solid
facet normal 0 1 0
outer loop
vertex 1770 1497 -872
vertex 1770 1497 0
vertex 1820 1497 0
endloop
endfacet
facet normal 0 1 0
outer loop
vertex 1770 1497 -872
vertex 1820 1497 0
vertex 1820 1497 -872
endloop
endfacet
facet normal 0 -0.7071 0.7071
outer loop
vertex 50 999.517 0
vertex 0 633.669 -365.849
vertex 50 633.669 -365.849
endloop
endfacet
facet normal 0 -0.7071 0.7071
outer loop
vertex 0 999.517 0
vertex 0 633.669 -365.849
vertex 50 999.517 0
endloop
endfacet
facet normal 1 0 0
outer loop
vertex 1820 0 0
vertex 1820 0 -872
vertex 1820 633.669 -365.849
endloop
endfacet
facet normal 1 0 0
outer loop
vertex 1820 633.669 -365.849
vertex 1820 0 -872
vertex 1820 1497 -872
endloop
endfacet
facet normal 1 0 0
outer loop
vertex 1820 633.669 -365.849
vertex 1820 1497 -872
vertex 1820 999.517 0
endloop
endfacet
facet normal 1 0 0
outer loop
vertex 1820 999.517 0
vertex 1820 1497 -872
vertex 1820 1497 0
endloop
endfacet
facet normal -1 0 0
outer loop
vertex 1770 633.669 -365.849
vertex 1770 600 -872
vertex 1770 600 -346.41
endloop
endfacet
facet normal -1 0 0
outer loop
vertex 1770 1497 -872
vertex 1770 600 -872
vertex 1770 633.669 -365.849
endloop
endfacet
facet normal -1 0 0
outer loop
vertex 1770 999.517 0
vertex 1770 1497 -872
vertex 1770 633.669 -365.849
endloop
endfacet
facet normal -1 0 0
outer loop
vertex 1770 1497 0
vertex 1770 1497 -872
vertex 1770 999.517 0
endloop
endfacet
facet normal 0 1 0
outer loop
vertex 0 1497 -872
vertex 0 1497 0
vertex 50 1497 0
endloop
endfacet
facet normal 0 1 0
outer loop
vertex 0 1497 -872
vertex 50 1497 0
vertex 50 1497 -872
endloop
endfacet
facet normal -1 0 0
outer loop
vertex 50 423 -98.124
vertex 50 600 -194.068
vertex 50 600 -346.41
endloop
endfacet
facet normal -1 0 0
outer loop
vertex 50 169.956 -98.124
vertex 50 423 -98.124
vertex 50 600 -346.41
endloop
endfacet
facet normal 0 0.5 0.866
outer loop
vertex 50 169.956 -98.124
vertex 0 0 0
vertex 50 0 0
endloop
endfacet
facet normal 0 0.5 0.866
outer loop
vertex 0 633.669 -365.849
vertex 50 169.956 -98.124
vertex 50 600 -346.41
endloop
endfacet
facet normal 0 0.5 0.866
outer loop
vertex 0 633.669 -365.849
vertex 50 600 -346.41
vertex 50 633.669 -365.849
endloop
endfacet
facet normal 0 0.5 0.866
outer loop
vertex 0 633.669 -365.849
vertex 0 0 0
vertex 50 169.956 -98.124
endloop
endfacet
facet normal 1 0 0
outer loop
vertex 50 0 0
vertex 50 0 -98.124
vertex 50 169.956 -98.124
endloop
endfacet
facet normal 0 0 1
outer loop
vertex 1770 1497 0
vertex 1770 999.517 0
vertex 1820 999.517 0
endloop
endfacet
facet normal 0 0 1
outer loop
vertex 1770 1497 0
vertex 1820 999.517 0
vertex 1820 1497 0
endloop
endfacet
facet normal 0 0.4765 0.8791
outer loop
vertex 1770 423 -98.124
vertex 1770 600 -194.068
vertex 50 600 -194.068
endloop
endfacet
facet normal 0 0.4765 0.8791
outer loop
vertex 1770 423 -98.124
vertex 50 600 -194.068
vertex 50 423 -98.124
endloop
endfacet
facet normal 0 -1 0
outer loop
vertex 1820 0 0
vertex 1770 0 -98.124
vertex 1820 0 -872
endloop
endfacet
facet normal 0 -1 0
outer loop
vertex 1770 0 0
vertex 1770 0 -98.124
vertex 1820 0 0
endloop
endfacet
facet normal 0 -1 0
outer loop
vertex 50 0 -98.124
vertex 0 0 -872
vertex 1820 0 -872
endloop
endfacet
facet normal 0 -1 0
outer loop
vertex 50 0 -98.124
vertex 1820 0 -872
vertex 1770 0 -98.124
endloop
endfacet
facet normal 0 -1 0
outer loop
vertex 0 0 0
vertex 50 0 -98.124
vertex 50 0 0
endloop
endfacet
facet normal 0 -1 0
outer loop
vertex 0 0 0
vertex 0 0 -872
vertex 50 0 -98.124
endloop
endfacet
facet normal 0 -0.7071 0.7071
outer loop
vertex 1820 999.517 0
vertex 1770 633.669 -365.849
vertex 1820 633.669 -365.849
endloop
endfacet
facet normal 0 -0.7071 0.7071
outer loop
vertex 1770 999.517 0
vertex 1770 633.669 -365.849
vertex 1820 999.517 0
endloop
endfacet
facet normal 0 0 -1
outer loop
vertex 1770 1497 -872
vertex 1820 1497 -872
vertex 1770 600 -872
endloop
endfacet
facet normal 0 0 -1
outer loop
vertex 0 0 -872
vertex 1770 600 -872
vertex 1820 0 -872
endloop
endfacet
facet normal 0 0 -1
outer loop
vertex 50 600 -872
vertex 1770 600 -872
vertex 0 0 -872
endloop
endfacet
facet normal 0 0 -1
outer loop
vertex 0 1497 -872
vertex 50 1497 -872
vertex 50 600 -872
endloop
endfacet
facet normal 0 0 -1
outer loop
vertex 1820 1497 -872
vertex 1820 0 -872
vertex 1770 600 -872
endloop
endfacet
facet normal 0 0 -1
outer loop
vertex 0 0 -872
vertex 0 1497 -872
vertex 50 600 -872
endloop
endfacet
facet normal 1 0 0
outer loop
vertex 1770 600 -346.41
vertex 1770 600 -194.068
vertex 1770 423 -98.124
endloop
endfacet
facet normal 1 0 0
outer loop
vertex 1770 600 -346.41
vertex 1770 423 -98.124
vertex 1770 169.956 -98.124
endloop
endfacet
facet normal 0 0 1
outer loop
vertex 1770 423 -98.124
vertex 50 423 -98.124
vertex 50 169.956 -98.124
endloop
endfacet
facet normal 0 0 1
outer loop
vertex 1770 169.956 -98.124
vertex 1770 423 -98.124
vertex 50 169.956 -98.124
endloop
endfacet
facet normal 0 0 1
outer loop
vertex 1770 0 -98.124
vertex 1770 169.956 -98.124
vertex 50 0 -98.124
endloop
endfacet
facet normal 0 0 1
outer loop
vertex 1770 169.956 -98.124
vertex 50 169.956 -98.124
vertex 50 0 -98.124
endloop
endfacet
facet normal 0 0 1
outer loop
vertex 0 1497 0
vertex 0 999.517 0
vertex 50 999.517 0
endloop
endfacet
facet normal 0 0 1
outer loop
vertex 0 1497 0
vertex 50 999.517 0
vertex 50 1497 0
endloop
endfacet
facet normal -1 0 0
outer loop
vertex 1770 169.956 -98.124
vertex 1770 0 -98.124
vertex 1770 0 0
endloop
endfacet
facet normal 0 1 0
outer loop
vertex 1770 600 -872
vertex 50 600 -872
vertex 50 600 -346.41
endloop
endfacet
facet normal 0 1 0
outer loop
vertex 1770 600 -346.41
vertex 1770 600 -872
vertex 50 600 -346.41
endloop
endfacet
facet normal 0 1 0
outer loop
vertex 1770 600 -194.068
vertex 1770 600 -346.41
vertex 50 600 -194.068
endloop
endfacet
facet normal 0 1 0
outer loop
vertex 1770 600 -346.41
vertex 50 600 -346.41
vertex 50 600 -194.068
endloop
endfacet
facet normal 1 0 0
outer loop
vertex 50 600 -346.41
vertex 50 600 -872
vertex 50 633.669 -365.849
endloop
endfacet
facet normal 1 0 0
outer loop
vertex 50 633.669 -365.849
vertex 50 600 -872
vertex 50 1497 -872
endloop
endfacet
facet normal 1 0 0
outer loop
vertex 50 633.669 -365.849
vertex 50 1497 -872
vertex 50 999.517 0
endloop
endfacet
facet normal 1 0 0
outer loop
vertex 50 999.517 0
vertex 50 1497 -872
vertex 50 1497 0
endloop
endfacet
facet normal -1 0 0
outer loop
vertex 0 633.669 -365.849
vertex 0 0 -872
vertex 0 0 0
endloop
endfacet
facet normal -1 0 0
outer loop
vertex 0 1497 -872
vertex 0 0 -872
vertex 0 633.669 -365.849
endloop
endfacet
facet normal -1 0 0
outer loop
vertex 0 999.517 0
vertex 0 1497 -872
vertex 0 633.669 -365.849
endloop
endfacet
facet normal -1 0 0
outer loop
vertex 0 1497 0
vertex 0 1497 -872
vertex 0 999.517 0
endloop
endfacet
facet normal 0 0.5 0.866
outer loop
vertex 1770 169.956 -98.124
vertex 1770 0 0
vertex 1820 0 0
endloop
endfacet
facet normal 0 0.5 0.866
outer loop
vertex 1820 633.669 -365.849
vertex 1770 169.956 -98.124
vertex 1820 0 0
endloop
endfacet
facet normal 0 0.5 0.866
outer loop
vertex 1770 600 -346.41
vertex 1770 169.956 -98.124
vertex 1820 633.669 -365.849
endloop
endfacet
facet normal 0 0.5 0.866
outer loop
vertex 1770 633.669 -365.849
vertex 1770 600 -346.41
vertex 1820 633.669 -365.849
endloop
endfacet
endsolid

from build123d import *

# Parameters (mm, degrees)
EXTRUDE_1_DEPTH     = 50
EXTRUDE_2_DEPTH     = 1720
EXTRUDE_START       = 1770
EXTRUDE_3_DEPTH     = 50
SKETCH_3_W          = 1820
SKETCH_3_H          = 1497
CUT_EXTRUDE_1_DEPTH = 850


with BuildPart() as part:
    # 草图1 → 凸台-拉伸1 (new body)
    with BuildSketch(Plane(origin=(0, 0, 0), x_dir=(0, 0, -1), z_dir=(1, 0, 0))):
        Polygon((0, 0), (365.848742481, 633.668609863), (0, 999.517352344), (0, 1497), (1722, 1497), (1722, 0), align=None)
    extrude(amount=EXTRUDE_1_DEPTH)

    # 草图2 → 凸台-拉伸2 (add)
    with BuildSketch(Plane(origin=(50, 0, 0), x_dir=(0, 0, -1), z_dir=(1, 0, 0))):
        Polygon((1722, 600), (194.068411452, 600), (98.124217521, 423), (98.124217521, 0), (1722, 0), align=None)
    extrude(amount=EXTRUDE_2_DEPTH)

    # 草图1<2> → 凸台-拉伸3 (add)
    with BuildSketch(Plane(origin=(0, 0, 0), x_dir=(0, 0, -1), z_dir=(1, 0, 0)).offset(EXTRUDE_START)):
        Polygon((0, 0), (365.848742481, 633.668609863), (0, 999.517352344), (0, 1497), (1722, 1497), (1722, 0), align=None)
    extrude(amount=EXTRUDE_3_DEPTH)

    # 草图3 → 切除-拉伸1 (cut)
    with BuildSketch(Plane(origin=(0, 0, -1722), x_dir=(-1, 0, 0), z_dir=(0, 0, -1))):
        with Locations((-910, 748.5)):
            Rectangle(SKETCH_3_W, SKETCH_3_H)
    extrude(amount=-CUT_EXTRUDE_1_DEPTH, mode=Mode.SUBTRACT)


solid = part.part
